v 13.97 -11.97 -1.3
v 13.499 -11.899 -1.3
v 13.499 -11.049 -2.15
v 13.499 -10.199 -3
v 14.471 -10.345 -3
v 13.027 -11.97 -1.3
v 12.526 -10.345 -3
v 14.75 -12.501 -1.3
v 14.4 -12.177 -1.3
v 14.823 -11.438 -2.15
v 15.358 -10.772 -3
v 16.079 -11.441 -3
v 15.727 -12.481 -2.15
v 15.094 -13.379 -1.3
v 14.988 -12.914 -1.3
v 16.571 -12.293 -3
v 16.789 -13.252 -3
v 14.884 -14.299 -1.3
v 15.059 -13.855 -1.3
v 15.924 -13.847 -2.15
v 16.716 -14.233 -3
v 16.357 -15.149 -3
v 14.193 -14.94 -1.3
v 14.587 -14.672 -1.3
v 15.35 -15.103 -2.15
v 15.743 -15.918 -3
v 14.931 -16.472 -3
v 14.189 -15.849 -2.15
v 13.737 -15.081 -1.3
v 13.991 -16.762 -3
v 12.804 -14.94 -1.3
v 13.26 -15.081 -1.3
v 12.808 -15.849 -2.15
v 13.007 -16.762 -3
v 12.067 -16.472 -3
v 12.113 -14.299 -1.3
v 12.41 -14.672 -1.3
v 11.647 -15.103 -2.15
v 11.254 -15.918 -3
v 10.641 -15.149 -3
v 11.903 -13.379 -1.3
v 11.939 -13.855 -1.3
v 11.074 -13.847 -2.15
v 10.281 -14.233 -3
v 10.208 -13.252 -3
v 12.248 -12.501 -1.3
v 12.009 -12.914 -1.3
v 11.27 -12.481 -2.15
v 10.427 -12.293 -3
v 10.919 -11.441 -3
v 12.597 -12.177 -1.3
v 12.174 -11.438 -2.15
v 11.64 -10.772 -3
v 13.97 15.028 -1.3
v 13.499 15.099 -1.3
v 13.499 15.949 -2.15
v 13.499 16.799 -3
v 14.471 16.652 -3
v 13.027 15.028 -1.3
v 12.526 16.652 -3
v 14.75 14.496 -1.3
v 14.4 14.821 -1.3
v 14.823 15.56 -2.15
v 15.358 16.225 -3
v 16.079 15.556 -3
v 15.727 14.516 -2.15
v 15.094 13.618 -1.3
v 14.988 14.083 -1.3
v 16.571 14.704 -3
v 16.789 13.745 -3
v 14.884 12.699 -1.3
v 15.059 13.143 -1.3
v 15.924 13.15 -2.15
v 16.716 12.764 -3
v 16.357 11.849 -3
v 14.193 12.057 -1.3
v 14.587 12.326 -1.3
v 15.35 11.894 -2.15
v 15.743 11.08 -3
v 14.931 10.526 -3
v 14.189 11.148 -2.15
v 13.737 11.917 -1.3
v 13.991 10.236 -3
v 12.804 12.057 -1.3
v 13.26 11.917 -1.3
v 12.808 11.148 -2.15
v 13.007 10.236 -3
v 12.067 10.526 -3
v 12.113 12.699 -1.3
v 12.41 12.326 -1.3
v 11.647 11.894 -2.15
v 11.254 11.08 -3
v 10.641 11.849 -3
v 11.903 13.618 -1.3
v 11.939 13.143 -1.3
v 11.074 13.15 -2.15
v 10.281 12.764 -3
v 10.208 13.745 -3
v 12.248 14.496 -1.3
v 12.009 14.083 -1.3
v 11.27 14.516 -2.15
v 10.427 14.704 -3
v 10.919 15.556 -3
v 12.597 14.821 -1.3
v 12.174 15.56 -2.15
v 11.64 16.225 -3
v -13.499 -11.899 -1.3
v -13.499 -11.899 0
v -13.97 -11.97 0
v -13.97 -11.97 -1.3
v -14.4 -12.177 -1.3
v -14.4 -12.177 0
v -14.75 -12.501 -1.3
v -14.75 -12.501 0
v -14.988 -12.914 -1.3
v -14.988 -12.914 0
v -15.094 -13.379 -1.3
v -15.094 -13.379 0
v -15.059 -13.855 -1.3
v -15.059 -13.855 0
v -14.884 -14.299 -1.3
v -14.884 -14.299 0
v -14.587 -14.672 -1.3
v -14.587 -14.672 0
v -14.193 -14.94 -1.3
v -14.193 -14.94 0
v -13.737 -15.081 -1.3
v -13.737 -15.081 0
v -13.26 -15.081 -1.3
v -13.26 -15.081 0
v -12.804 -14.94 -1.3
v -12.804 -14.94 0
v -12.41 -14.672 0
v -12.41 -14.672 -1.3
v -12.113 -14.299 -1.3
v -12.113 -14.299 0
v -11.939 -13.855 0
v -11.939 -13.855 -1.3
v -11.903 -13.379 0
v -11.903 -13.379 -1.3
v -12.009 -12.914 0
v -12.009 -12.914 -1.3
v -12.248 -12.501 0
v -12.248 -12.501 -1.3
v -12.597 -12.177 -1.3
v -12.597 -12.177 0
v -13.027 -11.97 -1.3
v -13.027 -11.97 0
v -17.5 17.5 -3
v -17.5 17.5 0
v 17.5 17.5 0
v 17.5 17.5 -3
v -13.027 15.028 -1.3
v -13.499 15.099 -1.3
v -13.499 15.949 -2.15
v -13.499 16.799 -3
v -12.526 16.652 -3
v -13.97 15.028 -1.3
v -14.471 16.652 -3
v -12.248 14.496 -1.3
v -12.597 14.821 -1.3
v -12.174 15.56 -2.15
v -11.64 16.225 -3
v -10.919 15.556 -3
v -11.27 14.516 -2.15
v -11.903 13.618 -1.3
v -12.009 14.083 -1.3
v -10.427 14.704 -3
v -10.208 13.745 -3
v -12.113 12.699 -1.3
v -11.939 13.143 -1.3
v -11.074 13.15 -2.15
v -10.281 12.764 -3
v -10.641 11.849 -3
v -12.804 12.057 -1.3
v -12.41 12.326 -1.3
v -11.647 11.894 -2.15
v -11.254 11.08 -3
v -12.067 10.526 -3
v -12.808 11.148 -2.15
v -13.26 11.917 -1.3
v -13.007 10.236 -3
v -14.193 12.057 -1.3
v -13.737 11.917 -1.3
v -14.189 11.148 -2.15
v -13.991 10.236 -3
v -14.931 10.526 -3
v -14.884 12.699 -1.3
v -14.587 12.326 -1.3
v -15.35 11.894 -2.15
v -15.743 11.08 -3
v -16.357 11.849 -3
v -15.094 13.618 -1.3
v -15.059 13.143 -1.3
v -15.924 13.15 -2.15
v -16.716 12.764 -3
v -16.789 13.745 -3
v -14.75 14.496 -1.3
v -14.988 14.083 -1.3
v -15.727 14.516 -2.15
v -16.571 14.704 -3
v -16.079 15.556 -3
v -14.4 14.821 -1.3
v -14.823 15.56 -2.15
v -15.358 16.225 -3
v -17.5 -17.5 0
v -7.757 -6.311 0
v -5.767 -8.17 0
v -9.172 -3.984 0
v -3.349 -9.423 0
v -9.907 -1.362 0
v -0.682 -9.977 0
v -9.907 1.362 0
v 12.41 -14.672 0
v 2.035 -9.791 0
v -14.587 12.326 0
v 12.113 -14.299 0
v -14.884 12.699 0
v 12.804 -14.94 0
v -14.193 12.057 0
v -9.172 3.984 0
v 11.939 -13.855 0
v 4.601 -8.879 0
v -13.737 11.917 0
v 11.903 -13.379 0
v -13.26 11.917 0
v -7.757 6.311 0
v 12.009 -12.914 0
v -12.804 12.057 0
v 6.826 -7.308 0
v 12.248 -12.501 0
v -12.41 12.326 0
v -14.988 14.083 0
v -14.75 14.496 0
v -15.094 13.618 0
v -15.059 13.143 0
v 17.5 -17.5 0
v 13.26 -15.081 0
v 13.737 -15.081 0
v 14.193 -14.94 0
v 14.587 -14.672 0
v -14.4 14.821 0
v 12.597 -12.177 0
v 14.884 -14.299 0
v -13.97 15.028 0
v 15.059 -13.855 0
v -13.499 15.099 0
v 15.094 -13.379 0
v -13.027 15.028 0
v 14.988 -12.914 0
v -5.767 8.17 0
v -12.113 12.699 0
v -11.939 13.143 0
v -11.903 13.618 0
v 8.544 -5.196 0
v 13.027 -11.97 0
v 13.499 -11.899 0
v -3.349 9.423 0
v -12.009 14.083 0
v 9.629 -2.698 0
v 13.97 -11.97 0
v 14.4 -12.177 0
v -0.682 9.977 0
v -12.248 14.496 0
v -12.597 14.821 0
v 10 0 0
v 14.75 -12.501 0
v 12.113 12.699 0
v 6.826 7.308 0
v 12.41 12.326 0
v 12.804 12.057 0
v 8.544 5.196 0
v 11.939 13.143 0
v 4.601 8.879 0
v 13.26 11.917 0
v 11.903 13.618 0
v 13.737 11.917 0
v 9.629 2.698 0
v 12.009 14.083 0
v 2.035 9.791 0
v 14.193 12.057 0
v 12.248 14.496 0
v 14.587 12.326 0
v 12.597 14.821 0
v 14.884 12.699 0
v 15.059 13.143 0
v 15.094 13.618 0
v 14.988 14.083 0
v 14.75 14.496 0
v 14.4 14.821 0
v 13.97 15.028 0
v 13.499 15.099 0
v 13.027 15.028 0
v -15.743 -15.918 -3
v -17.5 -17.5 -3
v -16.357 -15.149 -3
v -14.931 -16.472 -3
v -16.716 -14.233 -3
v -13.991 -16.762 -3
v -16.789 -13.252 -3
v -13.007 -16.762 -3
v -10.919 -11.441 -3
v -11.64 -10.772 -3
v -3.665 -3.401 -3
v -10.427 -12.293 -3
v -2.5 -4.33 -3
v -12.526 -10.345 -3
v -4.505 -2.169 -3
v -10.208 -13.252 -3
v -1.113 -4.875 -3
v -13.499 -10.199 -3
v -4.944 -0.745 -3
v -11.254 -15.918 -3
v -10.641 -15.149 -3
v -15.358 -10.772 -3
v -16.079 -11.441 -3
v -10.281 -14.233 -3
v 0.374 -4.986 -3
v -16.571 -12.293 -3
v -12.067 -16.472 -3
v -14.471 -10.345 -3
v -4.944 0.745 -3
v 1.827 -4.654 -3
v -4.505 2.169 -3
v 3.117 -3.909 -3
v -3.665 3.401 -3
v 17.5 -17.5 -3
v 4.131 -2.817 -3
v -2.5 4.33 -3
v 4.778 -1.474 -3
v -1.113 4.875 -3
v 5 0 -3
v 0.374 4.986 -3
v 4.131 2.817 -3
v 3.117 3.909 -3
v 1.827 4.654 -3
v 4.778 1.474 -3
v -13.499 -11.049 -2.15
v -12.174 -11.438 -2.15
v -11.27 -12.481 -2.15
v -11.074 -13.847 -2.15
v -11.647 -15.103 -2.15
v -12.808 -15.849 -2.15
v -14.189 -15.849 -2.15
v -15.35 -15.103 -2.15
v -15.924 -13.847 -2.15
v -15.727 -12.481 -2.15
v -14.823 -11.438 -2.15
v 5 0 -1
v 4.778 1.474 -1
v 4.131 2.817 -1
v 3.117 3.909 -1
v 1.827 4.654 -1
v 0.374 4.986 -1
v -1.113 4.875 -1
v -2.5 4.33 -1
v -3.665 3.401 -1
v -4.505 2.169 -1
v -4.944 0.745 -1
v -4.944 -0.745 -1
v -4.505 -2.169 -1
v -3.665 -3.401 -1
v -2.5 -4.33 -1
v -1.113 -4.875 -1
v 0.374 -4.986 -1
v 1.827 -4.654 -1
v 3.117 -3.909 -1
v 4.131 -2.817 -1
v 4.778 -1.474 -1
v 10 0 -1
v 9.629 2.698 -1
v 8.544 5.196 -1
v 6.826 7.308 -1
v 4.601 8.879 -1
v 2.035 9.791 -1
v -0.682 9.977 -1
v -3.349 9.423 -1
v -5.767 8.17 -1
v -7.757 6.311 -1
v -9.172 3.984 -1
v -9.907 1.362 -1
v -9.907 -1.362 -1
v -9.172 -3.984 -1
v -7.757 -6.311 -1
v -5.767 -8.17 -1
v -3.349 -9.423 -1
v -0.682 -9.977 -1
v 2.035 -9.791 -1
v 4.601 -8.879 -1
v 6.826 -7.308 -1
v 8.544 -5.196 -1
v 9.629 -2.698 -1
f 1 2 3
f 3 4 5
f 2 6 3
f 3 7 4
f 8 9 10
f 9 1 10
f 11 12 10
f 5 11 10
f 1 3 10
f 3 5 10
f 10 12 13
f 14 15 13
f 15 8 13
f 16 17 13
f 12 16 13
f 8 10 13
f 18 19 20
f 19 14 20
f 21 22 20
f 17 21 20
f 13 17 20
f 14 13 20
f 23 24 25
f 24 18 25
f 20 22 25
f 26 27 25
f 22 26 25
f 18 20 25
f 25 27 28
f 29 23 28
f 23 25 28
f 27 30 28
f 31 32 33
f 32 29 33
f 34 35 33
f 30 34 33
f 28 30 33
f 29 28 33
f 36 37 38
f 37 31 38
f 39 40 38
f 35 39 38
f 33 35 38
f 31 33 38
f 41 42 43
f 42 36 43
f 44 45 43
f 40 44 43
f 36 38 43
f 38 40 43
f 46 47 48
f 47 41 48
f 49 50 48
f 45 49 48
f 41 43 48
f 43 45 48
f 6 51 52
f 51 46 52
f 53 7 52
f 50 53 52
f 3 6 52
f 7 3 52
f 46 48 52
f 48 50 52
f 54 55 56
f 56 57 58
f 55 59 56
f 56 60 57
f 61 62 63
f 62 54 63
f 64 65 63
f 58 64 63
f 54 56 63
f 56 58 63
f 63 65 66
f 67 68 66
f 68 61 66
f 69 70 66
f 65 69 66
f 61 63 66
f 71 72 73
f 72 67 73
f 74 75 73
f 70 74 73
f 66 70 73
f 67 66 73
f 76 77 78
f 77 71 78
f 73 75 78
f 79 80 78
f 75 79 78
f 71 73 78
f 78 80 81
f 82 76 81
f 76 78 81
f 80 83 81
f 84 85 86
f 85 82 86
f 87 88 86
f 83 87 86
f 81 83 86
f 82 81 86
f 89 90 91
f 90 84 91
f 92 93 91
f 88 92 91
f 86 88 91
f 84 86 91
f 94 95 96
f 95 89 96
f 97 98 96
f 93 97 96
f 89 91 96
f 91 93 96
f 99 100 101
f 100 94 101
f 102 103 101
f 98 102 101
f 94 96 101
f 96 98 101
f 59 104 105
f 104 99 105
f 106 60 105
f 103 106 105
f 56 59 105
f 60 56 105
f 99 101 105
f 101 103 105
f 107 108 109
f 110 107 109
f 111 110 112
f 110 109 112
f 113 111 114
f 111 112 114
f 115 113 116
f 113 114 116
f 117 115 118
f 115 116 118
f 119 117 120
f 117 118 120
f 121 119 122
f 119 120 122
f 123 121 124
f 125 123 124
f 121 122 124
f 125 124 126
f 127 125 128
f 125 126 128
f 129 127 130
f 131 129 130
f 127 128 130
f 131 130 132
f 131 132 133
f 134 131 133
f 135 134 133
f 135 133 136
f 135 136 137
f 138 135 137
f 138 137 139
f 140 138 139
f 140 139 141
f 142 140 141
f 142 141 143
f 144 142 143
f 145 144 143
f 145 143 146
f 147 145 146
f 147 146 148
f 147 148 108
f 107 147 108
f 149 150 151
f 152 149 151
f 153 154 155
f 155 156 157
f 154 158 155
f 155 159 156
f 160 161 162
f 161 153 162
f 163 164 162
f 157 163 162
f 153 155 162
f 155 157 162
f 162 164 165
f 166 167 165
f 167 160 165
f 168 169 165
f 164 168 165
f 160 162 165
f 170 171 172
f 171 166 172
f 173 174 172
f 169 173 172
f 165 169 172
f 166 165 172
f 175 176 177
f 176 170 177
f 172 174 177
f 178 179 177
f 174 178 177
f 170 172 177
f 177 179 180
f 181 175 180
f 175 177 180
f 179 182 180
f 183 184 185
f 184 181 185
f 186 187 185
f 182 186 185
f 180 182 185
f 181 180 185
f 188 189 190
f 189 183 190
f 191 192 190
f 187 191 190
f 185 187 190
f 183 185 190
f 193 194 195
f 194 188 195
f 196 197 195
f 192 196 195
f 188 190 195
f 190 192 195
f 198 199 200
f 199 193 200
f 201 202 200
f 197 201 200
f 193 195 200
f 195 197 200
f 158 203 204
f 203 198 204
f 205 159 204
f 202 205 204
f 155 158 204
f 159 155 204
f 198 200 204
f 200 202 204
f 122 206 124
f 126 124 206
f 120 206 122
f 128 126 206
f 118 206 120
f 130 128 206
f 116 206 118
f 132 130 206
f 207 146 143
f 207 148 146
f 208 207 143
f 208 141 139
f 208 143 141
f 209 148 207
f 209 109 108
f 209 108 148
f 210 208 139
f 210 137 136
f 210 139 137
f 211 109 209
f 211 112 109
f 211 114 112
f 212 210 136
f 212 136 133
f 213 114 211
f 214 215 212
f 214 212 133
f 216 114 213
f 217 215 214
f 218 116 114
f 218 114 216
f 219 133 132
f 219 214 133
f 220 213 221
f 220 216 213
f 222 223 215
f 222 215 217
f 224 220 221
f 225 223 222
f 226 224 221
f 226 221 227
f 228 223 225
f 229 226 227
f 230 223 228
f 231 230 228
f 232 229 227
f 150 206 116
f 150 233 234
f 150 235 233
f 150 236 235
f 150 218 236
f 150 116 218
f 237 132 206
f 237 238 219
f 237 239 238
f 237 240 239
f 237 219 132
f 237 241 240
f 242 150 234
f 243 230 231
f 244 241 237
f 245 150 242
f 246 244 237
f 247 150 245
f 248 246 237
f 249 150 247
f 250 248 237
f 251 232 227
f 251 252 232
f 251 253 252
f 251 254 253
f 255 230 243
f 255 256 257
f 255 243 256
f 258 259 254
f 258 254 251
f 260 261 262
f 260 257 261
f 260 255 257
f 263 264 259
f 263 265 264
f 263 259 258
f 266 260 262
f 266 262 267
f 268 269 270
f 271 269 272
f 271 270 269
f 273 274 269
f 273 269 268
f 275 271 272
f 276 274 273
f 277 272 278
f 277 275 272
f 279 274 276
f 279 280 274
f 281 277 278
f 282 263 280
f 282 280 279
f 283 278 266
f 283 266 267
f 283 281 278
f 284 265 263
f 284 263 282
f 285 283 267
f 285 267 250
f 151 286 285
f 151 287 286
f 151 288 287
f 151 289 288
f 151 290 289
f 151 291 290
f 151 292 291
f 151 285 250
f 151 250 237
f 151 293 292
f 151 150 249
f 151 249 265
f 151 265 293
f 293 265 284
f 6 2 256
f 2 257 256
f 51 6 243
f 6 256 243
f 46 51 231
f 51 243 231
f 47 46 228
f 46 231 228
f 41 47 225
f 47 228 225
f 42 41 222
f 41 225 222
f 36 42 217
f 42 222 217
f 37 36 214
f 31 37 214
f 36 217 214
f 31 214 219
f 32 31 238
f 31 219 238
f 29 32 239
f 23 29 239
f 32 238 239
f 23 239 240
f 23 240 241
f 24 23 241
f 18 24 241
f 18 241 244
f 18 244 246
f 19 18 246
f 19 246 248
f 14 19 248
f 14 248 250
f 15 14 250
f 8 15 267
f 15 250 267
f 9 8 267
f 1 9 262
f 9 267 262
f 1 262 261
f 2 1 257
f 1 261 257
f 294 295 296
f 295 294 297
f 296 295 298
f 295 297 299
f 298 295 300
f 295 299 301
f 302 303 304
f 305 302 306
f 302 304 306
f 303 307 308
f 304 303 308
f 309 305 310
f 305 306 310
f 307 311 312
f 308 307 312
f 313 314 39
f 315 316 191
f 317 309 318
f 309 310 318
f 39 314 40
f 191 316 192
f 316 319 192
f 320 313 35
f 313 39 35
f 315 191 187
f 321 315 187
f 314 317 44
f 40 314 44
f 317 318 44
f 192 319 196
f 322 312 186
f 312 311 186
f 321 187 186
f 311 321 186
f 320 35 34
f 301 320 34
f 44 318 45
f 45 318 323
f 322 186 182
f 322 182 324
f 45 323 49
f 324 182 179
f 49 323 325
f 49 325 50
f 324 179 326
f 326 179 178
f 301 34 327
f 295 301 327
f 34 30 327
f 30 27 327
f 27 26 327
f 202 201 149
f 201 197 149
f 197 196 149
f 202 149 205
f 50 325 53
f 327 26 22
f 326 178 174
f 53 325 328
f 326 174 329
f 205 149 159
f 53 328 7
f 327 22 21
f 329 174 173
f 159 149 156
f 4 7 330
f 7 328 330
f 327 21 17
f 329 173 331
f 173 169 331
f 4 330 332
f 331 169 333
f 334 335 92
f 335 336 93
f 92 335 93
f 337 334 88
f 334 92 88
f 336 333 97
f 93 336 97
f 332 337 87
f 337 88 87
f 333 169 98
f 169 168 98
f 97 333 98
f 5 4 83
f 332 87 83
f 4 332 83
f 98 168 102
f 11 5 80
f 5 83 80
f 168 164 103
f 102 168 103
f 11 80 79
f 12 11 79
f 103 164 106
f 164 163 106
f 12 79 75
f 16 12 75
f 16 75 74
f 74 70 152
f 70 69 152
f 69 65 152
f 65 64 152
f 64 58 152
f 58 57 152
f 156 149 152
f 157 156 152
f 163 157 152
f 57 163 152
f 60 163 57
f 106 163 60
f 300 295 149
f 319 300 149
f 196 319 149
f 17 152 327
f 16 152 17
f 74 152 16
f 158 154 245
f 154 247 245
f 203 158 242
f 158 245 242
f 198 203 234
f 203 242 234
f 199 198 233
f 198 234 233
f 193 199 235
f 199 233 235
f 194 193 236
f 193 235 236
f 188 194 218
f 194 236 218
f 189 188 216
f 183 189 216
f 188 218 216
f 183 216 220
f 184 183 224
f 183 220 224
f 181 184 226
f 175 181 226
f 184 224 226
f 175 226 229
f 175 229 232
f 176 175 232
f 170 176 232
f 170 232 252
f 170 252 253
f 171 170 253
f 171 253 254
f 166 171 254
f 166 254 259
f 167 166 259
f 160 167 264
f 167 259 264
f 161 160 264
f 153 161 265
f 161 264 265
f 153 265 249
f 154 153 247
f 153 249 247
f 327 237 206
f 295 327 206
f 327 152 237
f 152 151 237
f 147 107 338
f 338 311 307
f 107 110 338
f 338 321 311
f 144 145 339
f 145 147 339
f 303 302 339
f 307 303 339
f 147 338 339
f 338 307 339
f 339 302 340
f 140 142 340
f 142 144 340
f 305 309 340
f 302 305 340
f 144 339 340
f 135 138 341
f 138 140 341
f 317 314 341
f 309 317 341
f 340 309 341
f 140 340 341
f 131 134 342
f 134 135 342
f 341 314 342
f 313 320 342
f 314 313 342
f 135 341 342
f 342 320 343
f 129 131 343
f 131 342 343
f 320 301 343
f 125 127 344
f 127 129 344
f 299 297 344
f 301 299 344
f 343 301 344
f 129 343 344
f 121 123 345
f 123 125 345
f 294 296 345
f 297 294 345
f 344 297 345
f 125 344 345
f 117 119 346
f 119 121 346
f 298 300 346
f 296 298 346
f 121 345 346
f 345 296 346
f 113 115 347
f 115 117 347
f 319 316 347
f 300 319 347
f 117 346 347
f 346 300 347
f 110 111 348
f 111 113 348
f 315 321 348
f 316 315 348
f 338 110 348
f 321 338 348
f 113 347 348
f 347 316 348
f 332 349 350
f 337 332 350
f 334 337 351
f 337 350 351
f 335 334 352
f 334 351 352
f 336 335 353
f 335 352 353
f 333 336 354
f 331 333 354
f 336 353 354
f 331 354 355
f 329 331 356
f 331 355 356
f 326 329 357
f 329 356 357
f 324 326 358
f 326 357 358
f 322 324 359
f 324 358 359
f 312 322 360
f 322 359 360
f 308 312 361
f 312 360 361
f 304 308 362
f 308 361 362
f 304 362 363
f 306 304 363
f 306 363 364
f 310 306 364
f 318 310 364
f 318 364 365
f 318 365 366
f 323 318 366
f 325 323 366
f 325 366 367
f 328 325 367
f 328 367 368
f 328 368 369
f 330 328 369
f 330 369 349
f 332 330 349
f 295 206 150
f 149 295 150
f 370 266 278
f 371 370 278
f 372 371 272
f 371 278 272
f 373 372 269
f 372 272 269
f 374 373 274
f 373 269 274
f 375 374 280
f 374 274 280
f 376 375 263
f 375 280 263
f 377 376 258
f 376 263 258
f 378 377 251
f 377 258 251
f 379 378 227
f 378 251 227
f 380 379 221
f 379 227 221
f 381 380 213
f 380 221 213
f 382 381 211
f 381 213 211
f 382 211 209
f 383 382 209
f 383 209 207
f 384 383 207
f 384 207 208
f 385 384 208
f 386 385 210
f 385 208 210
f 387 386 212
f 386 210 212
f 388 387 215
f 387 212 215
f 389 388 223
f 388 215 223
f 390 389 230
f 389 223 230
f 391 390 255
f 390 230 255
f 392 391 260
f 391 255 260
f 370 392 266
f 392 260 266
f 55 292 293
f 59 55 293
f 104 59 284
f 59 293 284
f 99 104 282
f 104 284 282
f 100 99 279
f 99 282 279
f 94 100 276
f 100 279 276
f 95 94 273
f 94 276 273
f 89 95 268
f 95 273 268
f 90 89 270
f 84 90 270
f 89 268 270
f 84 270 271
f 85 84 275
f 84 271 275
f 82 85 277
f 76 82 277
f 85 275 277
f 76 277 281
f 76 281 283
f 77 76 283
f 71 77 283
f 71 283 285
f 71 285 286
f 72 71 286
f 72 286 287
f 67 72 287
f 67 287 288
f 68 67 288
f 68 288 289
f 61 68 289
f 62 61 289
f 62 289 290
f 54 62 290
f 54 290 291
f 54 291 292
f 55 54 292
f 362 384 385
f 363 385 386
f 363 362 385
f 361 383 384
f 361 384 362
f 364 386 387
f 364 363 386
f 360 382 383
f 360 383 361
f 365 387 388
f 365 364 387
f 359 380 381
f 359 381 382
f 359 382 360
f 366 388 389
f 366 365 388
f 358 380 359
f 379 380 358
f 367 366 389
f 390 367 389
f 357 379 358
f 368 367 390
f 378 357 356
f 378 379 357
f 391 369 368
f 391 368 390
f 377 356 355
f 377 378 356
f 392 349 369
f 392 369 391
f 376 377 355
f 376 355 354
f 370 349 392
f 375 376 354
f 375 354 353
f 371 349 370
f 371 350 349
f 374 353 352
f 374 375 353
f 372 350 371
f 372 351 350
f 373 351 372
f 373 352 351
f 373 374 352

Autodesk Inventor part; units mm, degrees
ref_plane "YZ Plane" through (0, 0, 0) normal (1, 0, 0) x (0, 1, 0)
ref_plane "XZ Plane" through (0, 0, 0) normal (0, 1, 0) x (-1, 0, 0)
ref_plane "XY Plane" through (0, 0, 0) normal (0, 0, 1) x (1, 0, 0)
sketch "Sketch1" plane through (0, 0, 0) normal (0, 0, 1) x (1, 0, 0)
  line L0 (17.5, -17.5) -> (-17.5, -17.5)
  line L1 (-17.5, -17.5) -> (-17.5, 17.5)
  line L2 (-17.5, 17.5) -> (17.5, 17.5)
  line L3 (17.5, 17.5) -> (17.5, -17.5)
  line L4 (17.5, -17.5) -> (-17.5, 17.5) construction
  line L5 (-17.5, -17.5) -> (17.5, 17.5) construction
  circle A0 centre (-13.4987, -13.4987) radius 1.5
  circle A1 centre (13.4987, -13.4987) radius 1.5
  circle A2 centre (13.4987, 13.4987) radius 1.5
  circle A3 centre (-13.4987, 13.4987) radius 1.5
  circle A4 centre (0, 0) radius 5
  circle A5 centre (0, 0) radius 10
  dimension "d0" = 35
  dimension "d1" = 35
  dimension "d3" = 3
  dimension "d6" = 360
  dimension "d8" = 10
  dimension "d9" = 20
extrude "Extrusion1" add sketch "Sketch1" against normal blind 3 contours L0 L1 L2 L3 | A0 | A1 | A2 | A3 | A5
extrude "Extrusion2" cut sketch "Sketch1" against normal blind 1 contours A5
sketch "Sketch2" plane through (0, 0, -3) normal (0, 0, -1) x (-1, 0, 0)
  circle A0 centre (13.4987, 13.4987) radius 1.5 projected
  circle A1 centre (-13.4987, 13.4987) radius 1.5 projected
  circle A2 centre (-13.4987, -13.4987) radius 1.5 projected
  circle A3 centre (13.4987, -13.4987) radius 1.5 projected
  point P0 (0, 0)
hole "Hole2" at (13.4987, 13.4987, -3) at (-13.4987, 13.4987, -3) at (-13.4987, -13.4987, -3) at (13.4987, -13.4987, -3) direction (0, 0, 1) diameter 3.2 depth 3 countersink diameter 6.6 countersink angle 90
properties part number "АНЦП.014.00.00.004" material "PET Plastic"
